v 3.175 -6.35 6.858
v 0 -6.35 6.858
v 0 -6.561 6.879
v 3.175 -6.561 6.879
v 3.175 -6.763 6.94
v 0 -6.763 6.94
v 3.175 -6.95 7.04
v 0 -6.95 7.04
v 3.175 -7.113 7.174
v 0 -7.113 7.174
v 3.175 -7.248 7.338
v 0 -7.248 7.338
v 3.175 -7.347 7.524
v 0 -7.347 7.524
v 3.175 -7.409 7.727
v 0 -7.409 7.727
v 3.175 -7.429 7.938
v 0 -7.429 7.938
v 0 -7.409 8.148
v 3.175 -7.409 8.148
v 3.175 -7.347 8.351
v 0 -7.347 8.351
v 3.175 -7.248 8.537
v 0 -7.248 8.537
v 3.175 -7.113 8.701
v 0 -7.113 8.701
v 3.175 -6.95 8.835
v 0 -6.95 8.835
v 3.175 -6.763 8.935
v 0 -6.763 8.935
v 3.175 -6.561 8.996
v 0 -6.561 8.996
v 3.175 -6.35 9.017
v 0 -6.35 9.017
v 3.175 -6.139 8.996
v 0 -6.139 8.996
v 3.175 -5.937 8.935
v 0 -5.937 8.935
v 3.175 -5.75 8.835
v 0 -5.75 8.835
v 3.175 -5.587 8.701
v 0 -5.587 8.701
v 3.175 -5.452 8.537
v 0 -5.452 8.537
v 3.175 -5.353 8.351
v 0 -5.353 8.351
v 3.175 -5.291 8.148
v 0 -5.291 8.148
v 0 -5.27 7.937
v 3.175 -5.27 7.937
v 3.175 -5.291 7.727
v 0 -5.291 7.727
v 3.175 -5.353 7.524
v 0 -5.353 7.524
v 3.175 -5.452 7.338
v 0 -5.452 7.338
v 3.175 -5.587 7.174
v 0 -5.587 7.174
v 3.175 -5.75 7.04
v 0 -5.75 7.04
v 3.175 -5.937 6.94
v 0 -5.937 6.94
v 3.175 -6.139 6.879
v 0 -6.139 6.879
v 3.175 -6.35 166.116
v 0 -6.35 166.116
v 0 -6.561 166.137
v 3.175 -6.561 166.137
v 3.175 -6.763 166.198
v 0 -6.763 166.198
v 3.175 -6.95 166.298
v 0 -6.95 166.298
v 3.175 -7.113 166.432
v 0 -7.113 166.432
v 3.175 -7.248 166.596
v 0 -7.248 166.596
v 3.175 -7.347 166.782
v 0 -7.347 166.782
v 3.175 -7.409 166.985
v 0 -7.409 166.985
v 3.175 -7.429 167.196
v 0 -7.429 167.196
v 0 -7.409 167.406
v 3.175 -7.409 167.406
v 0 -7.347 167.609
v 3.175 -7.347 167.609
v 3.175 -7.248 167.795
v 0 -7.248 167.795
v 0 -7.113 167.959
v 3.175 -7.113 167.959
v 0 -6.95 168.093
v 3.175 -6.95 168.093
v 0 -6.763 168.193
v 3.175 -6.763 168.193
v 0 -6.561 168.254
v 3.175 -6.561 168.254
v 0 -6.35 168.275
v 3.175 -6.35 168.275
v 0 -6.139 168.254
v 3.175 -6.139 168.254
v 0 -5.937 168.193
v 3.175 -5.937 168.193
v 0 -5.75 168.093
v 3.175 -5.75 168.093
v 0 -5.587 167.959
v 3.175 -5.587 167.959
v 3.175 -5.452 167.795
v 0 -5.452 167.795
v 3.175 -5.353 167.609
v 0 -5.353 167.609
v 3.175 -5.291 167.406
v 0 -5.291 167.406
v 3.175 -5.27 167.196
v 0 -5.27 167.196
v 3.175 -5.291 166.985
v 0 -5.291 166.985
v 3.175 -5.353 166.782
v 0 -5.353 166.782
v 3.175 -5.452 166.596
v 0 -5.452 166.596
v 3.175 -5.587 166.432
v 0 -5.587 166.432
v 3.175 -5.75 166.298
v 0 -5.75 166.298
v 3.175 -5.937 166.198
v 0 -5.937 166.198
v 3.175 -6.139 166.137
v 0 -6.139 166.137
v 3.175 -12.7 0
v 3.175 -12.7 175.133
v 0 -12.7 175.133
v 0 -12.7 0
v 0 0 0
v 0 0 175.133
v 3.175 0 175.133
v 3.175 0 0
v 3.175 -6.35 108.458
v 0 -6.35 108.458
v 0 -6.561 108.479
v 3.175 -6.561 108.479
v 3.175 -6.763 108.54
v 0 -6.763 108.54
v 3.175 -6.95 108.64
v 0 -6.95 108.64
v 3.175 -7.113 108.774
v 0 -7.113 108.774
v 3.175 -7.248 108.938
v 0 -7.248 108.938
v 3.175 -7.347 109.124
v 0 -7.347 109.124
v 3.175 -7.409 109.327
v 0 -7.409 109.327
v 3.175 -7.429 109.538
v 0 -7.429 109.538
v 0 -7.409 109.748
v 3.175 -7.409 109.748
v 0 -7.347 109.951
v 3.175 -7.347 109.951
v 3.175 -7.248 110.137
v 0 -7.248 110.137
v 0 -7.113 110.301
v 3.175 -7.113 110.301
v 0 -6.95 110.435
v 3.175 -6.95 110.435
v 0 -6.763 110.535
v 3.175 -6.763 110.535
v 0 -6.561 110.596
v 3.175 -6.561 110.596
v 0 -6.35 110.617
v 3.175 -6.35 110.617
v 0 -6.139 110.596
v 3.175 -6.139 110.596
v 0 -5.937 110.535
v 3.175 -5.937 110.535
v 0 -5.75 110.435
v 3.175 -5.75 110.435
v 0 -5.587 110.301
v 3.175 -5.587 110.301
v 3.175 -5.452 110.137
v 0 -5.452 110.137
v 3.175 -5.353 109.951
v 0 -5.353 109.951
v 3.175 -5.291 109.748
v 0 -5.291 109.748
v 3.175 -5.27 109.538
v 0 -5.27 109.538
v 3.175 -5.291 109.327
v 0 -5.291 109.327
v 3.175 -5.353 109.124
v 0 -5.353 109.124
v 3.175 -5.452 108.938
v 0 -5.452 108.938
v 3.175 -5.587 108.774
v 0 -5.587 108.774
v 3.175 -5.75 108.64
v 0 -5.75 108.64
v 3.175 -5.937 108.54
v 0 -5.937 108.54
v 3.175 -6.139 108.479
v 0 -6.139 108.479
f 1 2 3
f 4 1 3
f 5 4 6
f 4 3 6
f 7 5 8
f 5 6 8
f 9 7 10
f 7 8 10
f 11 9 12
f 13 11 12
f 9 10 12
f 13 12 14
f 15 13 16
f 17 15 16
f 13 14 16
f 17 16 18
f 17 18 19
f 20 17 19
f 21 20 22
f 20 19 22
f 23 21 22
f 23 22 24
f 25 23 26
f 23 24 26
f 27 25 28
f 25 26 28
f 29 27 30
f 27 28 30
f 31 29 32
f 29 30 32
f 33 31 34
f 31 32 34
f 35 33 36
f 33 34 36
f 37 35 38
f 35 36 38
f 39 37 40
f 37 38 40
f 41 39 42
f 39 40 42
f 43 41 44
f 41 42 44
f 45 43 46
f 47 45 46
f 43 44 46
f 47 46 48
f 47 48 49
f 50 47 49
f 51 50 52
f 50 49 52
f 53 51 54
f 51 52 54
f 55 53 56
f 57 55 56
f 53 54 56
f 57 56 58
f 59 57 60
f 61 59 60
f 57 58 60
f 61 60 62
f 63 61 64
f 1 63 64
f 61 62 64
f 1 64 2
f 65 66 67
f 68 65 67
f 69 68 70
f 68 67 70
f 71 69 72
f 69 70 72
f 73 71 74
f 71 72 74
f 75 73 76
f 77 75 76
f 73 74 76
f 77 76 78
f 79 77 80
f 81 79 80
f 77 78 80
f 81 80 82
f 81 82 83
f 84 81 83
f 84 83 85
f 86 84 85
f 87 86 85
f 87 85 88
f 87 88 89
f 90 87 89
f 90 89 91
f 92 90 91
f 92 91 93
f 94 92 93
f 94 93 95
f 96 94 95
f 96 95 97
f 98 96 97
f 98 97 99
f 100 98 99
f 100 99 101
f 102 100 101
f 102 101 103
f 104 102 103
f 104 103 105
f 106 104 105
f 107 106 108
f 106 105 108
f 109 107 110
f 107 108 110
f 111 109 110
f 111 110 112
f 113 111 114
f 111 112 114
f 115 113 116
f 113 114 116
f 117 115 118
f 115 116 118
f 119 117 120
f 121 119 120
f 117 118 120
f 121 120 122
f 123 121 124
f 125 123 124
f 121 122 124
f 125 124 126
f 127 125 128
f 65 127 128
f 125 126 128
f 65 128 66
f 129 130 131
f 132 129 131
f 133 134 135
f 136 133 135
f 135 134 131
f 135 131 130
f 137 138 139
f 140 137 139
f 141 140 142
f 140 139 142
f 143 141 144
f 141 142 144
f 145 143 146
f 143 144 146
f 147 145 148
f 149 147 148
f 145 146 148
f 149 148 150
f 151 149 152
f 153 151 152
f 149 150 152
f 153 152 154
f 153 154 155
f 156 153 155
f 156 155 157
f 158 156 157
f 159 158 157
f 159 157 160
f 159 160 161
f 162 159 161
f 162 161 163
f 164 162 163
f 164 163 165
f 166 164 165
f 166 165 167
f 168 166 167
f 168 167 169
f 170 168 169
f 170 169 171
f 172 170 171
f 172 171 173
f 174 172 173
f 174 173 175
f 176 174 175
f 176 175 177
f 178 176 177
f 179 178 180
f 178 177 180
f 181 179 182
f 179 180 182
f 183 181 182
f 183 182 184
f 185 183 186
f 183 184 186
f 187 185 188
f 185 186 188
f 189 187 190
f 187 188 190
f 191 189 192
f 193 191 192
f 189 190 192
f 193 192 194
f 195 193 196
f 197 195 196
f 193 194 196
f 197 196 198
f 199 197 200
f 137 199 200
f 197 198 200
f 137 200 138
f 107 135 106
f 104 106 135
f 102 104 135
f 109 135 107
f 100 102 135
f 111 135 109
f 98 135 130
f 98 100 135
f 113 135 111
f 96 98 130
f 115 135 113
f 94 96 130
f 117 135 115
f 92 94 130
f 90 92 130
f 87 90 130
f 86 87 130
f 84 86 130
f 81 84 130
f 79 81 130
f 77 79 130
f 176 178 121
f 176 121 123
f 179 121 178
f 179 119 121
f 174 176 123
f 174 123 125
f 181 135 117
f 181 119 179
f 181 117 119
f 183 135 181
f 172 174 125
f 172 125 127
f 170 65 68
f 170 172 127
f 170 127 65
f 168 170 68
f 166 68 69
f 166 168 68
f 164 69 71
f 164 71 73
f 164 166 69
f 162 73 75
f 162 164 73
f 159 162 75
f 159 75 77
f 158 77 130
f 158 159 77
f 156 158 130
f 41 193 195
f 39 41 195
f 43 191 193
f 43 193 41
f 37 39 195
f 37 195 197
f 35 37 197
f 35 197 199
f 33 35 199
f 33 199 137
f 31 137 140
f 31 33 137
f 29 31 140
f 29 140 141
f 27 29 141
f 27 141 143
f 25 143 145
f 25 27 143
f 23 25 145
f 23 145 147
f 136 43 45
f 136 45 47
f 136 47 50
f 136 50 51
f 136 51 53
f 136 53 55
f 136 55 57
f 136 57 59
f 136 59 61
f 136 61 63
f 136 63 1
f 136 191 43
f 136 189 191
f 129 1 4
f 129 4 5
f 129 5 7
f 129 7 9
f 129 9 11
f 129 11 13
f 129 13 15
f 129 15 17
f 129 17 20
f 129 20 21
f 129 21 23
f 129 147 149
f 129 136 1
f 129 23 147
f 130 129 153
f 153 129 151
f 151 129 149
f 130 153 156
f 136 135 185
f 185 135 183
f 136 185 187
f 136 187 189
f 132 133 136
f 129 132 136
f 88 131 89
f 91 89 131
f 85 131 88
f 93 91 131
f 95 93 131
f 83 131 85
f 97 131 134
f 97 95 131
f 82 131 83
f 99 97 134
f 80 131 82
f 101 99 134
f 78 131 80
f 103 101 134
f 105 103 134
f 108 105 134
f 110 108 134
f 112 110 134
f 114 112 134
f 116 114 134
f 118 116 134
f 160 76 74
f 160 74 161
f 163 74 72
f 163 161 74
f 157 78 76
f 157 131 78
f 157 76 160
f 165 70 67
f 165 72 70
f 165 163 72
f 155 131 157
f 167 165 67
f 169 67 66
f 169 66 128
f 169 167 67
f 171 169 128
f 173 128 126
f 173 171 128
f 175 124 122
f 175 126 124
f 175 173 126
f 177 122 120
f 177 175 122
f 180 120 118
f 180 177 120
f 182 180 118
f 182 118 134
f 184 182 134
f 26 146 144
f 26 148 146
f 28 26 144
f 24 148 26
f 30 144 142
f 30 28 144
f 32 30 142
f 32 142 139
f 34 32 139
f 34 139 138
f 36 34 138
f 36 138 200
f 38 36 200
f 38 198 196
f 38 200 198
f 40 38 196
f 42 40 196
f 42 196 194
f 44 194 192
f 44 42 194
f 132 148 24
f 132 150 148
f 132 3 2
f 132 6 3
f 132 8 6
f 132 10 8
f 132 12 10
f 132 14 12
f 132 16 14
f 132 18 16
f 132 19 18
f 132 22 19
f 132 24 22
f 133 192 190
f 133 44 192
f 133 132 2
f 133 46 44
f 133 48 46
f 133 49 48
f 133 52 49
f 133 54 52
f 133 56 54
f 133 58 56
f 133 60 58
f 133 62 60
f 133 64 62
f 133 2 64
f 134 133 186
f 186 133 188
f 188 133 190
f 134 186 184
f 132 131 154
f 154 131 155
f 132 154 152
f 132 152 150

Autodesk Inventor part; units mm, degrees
ref_plane "YZ Plane" through (0, 0, 0) normal (1, 0, 0) x (0, 1, 0)
ref_plane "XZ Plane" through (0, 0, 0) normal (0, 1, 0) x (-1, 0, 0)
ref_plane "XY Plane" through (0, 0, 0) normal (0, 0, 1) x (1, 0, 0)
sketch "Sketch1" plane through (0, 0, 0) normal (0, 0, 1) x (1, 0, 0)
  line L0 (0, 0) -> (3.175, 0)
  line L1 (3.175, 0) -> (3.175, -12.7)
  line L2 (3.175, -12.7) -> (0, -12.7)
  line L3 (0, -12.7) -> (0, 0)
  dimension "d0" = 12.7
  dimension "d1" = 3.175
extrude "Extrusion1" add sketch "Sketch1" along normal blind 175.133
sketch "Sketch2" plane through (3.175, -12.7, 0) normal (1, 0, 0) x (0, 0, -1)
  line L0 (0, 12.7) -> (0, 0) projected
  circle A0 centre (-7.9375, 6.35) radius 0.7937
  circle A1 centre (-109.5375, 6.35) radius 0.7937
  circle A2 centre (-167.1955, 6.35) radius 0.7937
  dimension "d4" = 1.5875
  dimension "d5" = 7.9375
  dimension "d8" = 101.6
  dimension "d9" = 57.658
  dimension "d10" = 1.5875
  dimension "d11" = 1.5875
extrude "Extrusion2" cut sketch "Sketch2" against normal blind 25.4
hole "Hole1" at (3.175, -6.35, 109.5375) direction (-1, 0, 0) diameter 2.159 end through all
hole "Hole2" at (3.175, -6.35, 167.1955) direction (-1, 0, 0) diameter 2.159 end through all
hole "Hole3" at (3.175, -6.35, 7.9375) direction (-1, 0, 0) diameter 2.159 end through all
properties part number "Needle Bearing Mount Connector 2"
